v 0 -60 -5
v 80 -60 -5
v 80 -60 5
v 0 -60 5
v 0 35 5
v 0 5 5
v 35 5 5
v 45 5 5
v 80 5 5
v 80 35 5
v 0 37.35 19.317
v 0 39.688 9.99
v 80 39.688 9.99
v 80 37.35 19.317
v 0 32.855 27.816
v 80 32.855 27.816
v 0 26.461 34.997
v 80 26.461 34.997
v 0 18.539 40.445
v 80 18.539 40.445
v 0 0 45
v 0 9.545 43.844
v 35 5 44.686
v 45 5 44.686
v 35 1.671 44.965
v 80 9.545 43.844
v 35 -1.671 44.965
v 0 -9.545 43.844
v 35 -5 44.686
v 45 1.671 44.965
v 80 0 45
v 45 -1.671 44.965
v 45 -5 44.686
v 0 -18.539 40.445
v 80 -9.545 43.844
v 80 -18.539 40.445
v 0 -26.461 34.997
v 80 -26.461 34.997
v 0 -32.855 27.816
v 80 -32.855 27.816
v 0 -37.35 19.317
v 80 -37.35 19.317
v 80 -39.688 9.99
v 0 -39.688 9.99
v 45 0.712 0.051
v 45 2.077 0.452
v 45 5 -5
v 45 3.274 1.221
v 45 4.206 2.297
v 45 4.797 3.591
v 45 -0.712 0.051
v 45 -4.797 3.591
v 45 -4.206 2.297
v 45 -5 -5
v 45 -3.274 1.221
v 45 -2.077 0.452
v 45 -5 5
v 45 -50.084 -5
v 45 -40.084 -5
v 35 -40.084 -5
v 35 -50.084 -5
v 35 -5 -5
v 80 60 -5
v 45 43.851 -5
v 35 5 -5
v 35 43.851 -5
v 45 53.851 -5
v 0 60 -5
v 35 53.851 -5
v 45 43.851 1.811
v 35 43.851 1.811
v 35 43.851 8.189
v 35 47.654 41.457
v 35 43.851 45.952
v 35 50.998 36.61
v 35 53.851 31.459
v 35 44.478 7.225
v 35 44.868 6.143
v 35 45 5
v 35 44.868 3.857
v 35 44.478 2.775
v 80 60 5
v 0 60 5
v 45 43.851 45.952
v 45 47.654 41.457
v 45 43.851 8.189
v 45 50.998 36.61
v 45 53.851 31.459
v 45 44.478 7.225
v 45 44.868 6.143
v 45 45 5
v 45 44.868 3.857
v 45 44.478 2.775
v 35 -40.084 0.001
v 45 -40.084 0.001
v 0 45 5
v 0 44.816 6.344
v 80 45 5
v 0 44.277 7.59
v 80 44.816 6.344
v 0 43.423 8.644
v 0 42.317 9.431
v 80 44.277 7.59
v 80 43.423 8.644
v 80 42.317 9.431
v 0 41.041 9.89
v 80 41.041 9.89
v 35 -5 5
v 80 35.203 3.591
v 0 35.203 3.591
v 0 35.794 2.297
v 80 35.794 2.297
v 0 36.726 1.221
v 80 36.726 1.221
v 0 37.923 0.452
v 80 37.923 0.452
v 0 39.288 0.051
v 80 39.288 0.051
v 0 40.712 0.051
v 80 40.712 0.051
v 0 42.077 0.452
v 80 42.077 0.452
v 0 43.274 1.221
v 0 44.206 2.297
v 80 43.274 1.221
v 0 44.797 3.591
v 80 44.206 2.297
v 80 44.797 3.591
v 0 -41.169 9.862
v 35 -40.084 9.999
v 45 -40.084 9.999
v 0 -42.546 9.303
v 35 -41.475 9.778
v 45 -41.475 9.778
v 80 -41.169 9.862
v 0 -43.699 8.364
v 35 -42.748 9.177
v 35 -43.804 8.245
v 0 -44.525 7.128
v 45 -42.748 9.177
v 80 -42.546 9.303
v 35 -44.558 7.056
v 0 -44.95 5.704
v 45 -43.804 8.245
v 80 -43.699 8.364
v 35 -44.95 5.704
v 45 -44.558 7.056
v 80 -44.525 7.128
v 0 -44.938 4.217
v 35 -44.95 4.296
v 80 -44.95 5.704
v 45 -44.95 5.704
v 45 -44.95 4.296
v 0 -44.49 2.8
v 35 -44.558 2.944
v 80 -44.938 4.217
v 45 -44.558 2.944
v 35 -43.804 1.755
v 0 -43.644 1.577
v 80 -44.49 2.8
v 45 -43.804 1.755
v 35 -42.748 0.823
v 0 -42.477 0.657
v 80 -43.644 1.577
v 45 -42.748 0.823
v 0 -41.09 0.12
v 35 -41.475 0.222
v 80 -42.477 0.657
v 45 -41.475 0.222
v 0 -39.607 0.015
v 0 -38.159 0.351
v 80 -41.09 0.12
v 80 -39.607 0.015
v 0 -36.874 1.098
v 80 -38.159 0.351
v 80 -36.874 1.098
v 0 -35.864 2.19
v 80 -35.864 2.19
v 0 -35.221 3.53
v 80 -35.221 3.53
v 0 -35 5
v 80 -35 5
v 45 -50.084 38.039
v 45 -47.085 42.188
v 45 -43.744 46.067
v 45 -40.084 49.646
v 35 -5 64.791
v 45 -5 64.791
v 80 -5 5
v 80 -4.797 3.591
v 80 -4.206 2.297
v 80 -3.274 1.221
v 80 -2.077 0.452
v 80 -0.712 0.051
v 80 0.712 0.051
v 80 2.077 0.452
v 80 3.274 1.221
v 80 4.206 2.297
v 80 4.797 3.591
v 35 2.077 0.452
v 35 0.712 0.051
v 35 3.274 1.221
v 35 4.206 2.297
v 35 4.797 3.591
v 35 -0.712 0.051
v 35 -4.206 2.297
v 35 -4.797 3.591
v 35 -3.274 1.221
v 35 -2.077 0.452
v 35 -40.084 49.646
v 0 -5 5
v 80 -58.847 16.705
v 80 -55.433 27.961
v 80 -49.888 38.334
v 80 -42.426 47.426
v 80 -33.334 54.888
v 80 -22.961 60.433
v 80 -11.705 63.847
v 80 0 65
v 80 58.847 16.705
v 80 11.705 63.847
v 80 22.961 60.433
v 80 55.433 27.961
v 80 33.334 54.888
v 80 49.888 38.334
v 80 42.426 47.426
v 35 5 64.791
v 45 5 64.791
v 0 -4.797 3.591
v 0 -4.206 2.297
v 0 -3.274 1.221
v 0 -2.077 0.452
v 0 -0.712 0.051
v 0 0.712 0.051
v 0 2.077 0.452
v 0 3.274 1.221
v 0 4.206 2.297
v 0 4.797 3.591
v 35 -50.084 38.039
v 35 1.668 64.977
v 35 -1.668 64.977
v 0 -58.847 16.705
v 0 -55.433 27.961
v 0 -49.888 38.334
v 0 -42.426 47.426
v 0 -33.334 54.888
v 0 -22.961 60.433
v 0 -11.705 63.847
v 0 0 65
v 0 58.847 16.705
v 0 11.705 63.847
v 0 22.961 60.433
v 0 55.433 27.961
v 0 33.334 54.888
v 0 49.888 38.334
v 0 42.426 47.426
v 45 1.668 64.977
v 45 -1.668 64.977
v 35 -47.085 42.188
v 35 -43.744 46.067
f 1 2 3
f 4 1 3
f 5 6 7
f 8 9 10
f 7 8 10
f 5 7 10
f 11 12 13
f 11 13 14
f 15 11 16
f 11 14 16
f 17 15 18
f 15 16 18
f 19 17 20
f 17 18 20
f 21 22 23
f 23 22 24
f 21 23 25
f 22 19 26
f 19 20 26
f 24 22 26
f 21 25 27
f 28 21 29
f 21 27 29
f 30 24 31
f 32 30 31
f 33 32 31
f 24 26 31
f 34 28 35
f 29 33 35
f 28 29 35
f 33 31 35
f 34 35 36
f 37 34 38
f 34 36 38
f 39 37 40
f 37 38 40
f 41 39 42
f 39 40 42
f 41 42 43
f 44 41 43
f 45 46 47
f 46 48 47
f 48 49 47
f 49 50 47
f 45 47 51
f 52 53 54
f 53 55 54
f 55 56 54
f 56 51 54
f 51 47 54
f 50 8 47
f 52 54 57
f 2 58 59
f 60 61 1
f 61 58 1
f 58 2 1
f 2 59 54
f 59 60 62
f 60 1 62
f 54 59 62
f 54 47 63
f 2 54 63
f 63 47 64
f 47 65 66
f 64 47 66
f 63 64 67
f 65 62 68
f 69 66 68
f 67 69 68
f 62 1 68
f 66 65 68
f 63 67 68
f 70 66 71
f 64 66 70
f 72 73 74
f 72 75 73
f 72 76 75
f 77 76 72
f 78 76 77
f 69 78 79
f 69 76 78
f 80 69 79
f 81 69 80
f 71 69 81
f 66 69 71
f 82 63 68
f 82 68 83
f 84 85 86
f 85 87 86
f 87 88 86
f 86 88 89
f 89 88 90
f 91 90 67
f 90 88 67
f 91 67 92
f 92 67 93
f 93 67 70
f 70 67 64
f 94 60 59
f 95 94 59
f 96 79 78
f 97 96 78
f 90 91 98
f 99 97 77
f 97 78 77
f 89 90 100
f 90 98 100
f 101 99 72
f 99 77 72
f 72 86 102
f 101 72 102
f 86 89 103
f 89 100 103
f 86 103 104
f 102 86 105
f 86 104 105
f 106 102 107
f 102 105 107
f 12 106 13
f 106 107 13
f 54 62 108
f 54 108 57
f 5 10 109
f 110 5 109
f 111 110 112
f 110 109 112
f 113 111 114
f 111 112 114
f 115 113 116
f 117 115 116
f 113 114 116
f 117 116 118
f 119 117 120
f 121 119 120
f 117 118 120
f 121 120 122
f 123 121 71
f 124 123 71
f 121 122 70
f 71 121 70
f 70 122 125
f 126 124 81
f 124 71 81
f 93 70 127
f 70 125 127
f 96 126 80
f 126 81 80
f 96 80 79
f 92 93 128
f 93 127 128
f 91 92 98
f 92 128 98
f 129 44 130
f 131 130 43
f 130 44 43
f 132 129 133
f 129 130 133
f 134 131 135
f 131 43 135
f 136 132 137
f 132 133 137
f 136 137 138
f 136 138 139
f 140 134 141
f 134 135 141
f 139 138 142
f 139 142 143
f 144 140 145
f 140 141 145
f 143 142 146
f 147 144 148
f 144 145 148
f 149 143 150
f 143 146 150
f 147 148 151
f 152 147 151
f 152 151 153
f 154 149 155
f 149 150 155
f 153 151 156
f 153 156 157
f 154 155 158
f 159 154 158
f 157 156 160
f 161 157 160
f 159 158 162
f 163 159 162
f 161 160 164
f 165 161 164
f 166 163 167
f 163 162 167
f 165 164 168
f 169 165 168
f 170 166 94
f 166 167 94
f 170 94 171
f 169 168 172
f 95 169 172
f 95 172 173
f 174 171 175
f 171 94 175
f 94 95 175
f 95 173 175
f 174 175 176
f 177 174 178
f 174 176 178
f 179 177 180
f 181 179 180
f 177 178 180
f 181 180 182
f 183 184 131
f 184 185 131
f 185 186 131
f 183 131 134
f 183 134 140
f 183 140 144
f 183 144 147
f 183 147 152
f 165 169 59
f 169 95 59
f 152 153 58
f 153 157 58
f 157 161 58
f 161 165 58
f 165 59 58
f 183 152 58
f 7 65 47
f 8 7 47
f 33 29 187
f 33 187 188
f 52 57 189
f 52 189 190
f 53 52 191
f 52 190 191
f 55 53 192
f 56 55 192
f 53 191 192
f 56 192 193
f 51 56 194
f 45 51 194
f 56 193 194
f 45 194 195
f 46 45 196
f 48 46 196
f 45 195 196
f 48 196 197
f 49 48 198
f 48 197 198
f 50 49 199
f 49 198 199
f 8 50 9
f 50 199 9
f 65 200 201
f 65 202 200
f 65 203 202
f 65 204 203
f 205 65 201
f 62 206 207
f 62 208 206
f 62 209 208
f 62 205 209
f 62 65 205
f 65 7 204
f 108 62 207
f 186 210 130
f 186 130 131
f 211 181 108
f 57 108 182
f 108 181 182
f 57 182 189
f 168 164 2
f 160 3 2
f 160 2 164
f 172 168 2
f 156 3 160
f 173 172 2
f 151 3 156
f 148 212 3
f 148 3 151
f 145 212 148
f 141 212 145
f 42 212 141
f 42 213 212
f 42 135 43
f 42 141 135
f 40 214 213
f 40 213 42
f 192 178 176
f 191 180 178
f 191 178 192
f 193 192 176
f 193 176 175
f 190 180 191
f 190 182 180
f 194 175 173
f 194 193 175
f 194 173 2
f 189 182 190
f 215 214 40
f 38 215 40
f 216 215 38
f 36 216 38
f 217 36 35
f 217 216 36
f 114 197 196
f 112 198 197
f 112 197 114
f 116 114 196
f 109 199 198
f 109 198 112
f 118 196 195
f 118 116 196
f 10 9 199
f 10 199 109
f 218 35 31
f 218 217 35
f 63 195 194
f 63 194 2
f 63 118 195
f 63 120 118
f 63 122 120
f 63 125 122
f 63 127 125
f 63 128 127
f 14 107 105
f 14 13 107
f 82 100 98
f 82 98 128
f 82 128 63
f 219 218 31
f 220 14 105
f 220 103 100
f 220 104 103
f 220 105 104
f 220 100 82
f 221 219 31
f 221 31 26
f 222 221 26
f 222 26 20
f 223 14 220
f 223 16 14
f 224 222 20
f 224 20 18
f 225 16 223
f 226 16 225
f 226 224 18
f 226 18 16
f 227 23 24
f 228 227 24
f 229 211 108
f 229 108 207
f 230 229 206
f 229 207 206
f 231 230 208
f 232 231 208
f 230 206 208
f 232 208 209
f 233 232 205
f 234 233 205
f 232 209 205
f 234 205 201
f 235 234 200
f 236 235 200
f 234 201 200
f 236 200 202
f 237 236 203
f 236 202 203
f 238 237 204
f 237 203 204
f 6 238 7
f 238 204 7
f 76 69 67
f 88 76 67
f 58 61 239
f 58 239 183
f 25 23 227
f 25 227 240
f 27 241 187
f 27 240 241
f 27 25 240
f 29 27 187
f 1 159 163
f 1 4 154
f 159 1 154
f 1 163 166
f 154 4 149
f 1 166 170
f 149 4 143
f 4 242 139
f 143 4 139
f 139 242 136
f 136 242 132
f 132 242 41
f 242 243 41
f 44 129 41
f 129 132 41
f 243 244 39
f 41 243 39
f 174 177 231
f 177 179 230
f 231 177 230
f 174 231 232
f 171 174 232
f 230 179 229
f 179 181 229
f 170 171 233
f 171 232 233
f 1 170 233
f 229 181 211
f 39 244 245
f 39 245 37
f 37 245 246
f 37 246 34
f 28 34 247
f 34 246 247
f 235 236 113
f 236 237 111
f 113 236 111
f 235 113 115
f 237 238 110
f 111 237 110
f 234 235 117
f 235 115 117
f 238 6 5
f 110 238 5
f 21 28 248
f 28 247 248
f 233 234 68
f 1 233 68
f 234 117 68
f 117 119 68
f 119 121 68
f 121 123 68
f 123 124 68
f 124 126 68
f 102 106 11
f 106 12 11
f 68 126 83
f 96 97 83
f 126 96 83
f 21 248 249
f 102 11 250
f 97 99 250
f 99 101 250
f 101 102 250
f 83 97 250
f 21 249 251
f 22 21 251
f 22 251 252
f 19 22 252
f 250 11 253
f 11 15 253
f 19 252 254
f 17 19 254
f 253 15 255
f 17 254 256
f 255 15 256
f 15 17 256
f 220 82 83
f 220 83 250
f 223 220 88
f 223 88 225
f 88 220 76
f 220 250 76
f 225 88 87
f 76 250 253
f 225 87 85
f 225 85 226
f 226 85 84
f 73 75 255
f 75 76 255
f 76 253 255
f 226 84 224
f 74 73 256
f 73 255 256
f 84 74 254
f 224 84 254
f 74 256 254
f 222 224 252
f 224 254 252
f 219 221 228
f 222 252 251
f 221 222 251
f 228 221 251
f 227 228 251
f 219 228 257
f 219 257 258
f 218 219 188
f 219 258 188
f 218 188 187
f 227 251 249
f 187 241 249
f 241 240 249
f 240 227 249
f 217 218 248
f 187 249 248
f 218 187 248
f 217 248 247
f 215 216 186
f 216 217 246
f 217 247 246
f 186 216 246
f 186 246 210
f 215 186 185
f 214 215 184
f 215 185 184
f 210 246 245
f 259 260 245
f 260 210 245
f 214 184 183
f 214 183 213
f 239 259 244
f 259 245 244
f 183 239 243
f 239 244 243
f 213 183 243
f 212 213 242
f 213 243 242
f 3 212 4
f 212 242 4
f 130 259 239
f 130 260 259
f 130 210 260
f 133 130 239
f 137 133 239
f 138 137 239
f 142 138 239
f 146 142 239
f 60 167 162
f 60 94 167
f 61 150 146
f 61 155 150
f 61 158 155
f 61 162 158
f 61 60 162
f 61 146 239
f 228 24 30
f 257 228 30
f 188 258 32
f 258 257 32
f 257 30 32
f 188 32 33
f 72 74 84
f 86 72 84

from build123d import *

# Parameters (mm, degrees)
F0_W     = 120
F0_H     = 10
F1_DEPTH = 80
F3_DEPTH = 80.001
F4_DEPTH = 25
F5_W     = 10
F5_H     = 10
F6_DEPTH = 70.001


with BuildPart() as f1:
    # F0 (on Right) → F1 (new body)
    with BuildSketch(Plane.YZ):
        Rectangle(F0_W, F0_H)
        with BuildLine():
            ThreePointArc((60, 5), (0, 65), (-60, 5))
            Line((-60, 5), (60, 5))
        make_face()
    extrude(amount=F1_DEPTH)

    # F2 (on face) → F3 (cut, through all)
    with BuildSketch(Plane.YZ.offset(80)):
        with BuildLine():
            Line((-5, 5), (5, 5))
            ThreePointArc((5, 5), (0, 10), (-5, 5))
        make_face()
        with BuildLine():
            ThreePointArc((-5, 5), (0, 0), (5, 5))
            Line((5, 5), (-5, 5))
        make_face()
        with BuildLine():
            ThreePointArc((-5, 5), (0, 10), (5, 5))
            Line((5, 5), (35, 5))
            ThreePointArc((35, 5), (36.3556550657, 8.4232659844), (39.6875, 9.9902248196))
            ThreePointArc((39.6875, 9.9902248196), (0, 45), (-39.6875, 9.9902248196))
            ThreePointArc((-39.6875, 9.9902248196), (-36.3556550657, 8.4232659844), (-35, 5))
            Line((-35, 5), (-5, 5))
        make_face()
        with BuildLine():
            Line((40, 5), (35, 5))
            ThreePointArc((35, 5), (40, 0), (45, 5))
            ThreePointArc((45, 5), (43.4232659844, 8.6443449343), (39.6875, 9.9902248196))
            ThreePointArc((39.6875, 9.9902248196), (39.9217985567, 7.5), (40, 5))
        make_face()
        with BuildLine():
            ThreePointArc((39.6875, 9.9902248196), (36.3556550657, 8.4232659844), (35, 5))
            Line((35, 5), (40, 5))
            ThreePointArc((40, 5), (39.9217985567, 7.5), (39.6875, 9.9902248196))
        make_face()
        with BuildLine():
            Line((-40, 5), (-35, 5))
            ThreePointArc((-35, 5), (-36.3556550657, 8.4232659844), (-39.6875, 9.9902248196))
            ThreePointArc((-39.6875, 9.9902248196), (-39.9217985567, 7.5), (-40, 5))
        make_face()
        with BuildLine():
            ThreePointArc((-39.6875, 9.9902248196), (-43.6443449343, 1.5767340156), (-35, 5))
            Line((-35, 5), (-40, 5))
            ThreePointArc((-40, 5), (-39.9217985567, 7.5), (-39.6875, 9.9902248196))
        make_face()
    extrude(amount=-F3_DEPTH, mode=Mode.SUBTRACT)

    # F2 (on face) → F4 (cut)
    with BuildSketch(Plane.YZ.offset(80)):
        with BuildLine():
            Line((-5, 5), (5, 5))
            ThreePointArc((5, 5), (0, 10), (-5, 5))
        make_face()
        with BuildLine():
            ThreePointArc((-5, 5), (0, 0), (5, 5))
            Line((5, 5), (-5, 5))
        make_face()
        with BuildLine():
            ThreePointArc((-5, 5), (0, 10), (5, 5))
            Line((5, 5), (35, 5))
            ThreePointArc((35, 5), (36.3556550657, 8.4232659844), (39.6875, 9.9902248196))
            ThreePointArc((39.6875, 9.9902248196), (0, 45), (-39.6875, 9.9902248196))
            ThreePointArc((-39.6875, 9.9902248196), (-36.3556550657, 8.4232659844), (-35, 5))
            Line((-35, 5), (-5, 5))
        make_face()
        with BuildLine():
            Line((40, 5), (35, 5))
            ThreePointArc((35, 5), (40, 0), (45, 5))
            ThreePointArc((45, 5), (43.4232659844, 8.6443449343), (39.6875, 9.9902248196))
            ThreePointArc((39.6875, 9.9902248196), (39.9217985567, 7.5), (40, 5))
        make_face()
        with BuildLine():
            ThreePointArc((39.6875, 9.9902248196), (36.3556550657, 8.4232659844), (35, 5))
            Line((35, 5), (40, 5))
            ThreePointArc((40, 5), (39.9217985567, 7.5), (39.6875, 9.9902248196))
        make_face()
        with BuildLine():
            Line((-40, 5), (-35, 5))
            ThreePointArc((-35, 5), (-36.3556550657, 8.4232659844), (-39.6875, 9.9902248196))
            ThreePointArc((-39.6875, 9.9902248196), (-39.9217985567, 7.5), (-40, 5))
        make_face()
        with BuildLine():
            ThreePointArc((-39.6875, 9.9902248196), (-43.6443449343, 1.5767340156), (-35, 5))
            Line((-35, 5), (-40, 5))
            ThreePointArc((-40, 5), (-39.9217985567, 7.5), (-39.6875, 9.9902248196))
        make_face()
    extrude(amount=-F4_DEPTH, mode=Mode.SUBTRACT)

    # F5 (on face) → F6 (cut, through all)
    with BuildSketch(Plane(origin=(0, 0, -5), x_dir=(1, 0, 0), z_dir=(0, 0, -1))):
        with Locations((40, 45.0840815902)):
            Rectangle(F5_W, F5_H)
        with Locations((40, 0)):
            Rectangle(F5_W, F5_H)
        with Locations((40, -48.8508976996)):
            Rectangle(F5_W, F5_H)
    extrude(amount=-F6_DEPTH, mode=Mode.SUBTRACT)


solid = f1.part
